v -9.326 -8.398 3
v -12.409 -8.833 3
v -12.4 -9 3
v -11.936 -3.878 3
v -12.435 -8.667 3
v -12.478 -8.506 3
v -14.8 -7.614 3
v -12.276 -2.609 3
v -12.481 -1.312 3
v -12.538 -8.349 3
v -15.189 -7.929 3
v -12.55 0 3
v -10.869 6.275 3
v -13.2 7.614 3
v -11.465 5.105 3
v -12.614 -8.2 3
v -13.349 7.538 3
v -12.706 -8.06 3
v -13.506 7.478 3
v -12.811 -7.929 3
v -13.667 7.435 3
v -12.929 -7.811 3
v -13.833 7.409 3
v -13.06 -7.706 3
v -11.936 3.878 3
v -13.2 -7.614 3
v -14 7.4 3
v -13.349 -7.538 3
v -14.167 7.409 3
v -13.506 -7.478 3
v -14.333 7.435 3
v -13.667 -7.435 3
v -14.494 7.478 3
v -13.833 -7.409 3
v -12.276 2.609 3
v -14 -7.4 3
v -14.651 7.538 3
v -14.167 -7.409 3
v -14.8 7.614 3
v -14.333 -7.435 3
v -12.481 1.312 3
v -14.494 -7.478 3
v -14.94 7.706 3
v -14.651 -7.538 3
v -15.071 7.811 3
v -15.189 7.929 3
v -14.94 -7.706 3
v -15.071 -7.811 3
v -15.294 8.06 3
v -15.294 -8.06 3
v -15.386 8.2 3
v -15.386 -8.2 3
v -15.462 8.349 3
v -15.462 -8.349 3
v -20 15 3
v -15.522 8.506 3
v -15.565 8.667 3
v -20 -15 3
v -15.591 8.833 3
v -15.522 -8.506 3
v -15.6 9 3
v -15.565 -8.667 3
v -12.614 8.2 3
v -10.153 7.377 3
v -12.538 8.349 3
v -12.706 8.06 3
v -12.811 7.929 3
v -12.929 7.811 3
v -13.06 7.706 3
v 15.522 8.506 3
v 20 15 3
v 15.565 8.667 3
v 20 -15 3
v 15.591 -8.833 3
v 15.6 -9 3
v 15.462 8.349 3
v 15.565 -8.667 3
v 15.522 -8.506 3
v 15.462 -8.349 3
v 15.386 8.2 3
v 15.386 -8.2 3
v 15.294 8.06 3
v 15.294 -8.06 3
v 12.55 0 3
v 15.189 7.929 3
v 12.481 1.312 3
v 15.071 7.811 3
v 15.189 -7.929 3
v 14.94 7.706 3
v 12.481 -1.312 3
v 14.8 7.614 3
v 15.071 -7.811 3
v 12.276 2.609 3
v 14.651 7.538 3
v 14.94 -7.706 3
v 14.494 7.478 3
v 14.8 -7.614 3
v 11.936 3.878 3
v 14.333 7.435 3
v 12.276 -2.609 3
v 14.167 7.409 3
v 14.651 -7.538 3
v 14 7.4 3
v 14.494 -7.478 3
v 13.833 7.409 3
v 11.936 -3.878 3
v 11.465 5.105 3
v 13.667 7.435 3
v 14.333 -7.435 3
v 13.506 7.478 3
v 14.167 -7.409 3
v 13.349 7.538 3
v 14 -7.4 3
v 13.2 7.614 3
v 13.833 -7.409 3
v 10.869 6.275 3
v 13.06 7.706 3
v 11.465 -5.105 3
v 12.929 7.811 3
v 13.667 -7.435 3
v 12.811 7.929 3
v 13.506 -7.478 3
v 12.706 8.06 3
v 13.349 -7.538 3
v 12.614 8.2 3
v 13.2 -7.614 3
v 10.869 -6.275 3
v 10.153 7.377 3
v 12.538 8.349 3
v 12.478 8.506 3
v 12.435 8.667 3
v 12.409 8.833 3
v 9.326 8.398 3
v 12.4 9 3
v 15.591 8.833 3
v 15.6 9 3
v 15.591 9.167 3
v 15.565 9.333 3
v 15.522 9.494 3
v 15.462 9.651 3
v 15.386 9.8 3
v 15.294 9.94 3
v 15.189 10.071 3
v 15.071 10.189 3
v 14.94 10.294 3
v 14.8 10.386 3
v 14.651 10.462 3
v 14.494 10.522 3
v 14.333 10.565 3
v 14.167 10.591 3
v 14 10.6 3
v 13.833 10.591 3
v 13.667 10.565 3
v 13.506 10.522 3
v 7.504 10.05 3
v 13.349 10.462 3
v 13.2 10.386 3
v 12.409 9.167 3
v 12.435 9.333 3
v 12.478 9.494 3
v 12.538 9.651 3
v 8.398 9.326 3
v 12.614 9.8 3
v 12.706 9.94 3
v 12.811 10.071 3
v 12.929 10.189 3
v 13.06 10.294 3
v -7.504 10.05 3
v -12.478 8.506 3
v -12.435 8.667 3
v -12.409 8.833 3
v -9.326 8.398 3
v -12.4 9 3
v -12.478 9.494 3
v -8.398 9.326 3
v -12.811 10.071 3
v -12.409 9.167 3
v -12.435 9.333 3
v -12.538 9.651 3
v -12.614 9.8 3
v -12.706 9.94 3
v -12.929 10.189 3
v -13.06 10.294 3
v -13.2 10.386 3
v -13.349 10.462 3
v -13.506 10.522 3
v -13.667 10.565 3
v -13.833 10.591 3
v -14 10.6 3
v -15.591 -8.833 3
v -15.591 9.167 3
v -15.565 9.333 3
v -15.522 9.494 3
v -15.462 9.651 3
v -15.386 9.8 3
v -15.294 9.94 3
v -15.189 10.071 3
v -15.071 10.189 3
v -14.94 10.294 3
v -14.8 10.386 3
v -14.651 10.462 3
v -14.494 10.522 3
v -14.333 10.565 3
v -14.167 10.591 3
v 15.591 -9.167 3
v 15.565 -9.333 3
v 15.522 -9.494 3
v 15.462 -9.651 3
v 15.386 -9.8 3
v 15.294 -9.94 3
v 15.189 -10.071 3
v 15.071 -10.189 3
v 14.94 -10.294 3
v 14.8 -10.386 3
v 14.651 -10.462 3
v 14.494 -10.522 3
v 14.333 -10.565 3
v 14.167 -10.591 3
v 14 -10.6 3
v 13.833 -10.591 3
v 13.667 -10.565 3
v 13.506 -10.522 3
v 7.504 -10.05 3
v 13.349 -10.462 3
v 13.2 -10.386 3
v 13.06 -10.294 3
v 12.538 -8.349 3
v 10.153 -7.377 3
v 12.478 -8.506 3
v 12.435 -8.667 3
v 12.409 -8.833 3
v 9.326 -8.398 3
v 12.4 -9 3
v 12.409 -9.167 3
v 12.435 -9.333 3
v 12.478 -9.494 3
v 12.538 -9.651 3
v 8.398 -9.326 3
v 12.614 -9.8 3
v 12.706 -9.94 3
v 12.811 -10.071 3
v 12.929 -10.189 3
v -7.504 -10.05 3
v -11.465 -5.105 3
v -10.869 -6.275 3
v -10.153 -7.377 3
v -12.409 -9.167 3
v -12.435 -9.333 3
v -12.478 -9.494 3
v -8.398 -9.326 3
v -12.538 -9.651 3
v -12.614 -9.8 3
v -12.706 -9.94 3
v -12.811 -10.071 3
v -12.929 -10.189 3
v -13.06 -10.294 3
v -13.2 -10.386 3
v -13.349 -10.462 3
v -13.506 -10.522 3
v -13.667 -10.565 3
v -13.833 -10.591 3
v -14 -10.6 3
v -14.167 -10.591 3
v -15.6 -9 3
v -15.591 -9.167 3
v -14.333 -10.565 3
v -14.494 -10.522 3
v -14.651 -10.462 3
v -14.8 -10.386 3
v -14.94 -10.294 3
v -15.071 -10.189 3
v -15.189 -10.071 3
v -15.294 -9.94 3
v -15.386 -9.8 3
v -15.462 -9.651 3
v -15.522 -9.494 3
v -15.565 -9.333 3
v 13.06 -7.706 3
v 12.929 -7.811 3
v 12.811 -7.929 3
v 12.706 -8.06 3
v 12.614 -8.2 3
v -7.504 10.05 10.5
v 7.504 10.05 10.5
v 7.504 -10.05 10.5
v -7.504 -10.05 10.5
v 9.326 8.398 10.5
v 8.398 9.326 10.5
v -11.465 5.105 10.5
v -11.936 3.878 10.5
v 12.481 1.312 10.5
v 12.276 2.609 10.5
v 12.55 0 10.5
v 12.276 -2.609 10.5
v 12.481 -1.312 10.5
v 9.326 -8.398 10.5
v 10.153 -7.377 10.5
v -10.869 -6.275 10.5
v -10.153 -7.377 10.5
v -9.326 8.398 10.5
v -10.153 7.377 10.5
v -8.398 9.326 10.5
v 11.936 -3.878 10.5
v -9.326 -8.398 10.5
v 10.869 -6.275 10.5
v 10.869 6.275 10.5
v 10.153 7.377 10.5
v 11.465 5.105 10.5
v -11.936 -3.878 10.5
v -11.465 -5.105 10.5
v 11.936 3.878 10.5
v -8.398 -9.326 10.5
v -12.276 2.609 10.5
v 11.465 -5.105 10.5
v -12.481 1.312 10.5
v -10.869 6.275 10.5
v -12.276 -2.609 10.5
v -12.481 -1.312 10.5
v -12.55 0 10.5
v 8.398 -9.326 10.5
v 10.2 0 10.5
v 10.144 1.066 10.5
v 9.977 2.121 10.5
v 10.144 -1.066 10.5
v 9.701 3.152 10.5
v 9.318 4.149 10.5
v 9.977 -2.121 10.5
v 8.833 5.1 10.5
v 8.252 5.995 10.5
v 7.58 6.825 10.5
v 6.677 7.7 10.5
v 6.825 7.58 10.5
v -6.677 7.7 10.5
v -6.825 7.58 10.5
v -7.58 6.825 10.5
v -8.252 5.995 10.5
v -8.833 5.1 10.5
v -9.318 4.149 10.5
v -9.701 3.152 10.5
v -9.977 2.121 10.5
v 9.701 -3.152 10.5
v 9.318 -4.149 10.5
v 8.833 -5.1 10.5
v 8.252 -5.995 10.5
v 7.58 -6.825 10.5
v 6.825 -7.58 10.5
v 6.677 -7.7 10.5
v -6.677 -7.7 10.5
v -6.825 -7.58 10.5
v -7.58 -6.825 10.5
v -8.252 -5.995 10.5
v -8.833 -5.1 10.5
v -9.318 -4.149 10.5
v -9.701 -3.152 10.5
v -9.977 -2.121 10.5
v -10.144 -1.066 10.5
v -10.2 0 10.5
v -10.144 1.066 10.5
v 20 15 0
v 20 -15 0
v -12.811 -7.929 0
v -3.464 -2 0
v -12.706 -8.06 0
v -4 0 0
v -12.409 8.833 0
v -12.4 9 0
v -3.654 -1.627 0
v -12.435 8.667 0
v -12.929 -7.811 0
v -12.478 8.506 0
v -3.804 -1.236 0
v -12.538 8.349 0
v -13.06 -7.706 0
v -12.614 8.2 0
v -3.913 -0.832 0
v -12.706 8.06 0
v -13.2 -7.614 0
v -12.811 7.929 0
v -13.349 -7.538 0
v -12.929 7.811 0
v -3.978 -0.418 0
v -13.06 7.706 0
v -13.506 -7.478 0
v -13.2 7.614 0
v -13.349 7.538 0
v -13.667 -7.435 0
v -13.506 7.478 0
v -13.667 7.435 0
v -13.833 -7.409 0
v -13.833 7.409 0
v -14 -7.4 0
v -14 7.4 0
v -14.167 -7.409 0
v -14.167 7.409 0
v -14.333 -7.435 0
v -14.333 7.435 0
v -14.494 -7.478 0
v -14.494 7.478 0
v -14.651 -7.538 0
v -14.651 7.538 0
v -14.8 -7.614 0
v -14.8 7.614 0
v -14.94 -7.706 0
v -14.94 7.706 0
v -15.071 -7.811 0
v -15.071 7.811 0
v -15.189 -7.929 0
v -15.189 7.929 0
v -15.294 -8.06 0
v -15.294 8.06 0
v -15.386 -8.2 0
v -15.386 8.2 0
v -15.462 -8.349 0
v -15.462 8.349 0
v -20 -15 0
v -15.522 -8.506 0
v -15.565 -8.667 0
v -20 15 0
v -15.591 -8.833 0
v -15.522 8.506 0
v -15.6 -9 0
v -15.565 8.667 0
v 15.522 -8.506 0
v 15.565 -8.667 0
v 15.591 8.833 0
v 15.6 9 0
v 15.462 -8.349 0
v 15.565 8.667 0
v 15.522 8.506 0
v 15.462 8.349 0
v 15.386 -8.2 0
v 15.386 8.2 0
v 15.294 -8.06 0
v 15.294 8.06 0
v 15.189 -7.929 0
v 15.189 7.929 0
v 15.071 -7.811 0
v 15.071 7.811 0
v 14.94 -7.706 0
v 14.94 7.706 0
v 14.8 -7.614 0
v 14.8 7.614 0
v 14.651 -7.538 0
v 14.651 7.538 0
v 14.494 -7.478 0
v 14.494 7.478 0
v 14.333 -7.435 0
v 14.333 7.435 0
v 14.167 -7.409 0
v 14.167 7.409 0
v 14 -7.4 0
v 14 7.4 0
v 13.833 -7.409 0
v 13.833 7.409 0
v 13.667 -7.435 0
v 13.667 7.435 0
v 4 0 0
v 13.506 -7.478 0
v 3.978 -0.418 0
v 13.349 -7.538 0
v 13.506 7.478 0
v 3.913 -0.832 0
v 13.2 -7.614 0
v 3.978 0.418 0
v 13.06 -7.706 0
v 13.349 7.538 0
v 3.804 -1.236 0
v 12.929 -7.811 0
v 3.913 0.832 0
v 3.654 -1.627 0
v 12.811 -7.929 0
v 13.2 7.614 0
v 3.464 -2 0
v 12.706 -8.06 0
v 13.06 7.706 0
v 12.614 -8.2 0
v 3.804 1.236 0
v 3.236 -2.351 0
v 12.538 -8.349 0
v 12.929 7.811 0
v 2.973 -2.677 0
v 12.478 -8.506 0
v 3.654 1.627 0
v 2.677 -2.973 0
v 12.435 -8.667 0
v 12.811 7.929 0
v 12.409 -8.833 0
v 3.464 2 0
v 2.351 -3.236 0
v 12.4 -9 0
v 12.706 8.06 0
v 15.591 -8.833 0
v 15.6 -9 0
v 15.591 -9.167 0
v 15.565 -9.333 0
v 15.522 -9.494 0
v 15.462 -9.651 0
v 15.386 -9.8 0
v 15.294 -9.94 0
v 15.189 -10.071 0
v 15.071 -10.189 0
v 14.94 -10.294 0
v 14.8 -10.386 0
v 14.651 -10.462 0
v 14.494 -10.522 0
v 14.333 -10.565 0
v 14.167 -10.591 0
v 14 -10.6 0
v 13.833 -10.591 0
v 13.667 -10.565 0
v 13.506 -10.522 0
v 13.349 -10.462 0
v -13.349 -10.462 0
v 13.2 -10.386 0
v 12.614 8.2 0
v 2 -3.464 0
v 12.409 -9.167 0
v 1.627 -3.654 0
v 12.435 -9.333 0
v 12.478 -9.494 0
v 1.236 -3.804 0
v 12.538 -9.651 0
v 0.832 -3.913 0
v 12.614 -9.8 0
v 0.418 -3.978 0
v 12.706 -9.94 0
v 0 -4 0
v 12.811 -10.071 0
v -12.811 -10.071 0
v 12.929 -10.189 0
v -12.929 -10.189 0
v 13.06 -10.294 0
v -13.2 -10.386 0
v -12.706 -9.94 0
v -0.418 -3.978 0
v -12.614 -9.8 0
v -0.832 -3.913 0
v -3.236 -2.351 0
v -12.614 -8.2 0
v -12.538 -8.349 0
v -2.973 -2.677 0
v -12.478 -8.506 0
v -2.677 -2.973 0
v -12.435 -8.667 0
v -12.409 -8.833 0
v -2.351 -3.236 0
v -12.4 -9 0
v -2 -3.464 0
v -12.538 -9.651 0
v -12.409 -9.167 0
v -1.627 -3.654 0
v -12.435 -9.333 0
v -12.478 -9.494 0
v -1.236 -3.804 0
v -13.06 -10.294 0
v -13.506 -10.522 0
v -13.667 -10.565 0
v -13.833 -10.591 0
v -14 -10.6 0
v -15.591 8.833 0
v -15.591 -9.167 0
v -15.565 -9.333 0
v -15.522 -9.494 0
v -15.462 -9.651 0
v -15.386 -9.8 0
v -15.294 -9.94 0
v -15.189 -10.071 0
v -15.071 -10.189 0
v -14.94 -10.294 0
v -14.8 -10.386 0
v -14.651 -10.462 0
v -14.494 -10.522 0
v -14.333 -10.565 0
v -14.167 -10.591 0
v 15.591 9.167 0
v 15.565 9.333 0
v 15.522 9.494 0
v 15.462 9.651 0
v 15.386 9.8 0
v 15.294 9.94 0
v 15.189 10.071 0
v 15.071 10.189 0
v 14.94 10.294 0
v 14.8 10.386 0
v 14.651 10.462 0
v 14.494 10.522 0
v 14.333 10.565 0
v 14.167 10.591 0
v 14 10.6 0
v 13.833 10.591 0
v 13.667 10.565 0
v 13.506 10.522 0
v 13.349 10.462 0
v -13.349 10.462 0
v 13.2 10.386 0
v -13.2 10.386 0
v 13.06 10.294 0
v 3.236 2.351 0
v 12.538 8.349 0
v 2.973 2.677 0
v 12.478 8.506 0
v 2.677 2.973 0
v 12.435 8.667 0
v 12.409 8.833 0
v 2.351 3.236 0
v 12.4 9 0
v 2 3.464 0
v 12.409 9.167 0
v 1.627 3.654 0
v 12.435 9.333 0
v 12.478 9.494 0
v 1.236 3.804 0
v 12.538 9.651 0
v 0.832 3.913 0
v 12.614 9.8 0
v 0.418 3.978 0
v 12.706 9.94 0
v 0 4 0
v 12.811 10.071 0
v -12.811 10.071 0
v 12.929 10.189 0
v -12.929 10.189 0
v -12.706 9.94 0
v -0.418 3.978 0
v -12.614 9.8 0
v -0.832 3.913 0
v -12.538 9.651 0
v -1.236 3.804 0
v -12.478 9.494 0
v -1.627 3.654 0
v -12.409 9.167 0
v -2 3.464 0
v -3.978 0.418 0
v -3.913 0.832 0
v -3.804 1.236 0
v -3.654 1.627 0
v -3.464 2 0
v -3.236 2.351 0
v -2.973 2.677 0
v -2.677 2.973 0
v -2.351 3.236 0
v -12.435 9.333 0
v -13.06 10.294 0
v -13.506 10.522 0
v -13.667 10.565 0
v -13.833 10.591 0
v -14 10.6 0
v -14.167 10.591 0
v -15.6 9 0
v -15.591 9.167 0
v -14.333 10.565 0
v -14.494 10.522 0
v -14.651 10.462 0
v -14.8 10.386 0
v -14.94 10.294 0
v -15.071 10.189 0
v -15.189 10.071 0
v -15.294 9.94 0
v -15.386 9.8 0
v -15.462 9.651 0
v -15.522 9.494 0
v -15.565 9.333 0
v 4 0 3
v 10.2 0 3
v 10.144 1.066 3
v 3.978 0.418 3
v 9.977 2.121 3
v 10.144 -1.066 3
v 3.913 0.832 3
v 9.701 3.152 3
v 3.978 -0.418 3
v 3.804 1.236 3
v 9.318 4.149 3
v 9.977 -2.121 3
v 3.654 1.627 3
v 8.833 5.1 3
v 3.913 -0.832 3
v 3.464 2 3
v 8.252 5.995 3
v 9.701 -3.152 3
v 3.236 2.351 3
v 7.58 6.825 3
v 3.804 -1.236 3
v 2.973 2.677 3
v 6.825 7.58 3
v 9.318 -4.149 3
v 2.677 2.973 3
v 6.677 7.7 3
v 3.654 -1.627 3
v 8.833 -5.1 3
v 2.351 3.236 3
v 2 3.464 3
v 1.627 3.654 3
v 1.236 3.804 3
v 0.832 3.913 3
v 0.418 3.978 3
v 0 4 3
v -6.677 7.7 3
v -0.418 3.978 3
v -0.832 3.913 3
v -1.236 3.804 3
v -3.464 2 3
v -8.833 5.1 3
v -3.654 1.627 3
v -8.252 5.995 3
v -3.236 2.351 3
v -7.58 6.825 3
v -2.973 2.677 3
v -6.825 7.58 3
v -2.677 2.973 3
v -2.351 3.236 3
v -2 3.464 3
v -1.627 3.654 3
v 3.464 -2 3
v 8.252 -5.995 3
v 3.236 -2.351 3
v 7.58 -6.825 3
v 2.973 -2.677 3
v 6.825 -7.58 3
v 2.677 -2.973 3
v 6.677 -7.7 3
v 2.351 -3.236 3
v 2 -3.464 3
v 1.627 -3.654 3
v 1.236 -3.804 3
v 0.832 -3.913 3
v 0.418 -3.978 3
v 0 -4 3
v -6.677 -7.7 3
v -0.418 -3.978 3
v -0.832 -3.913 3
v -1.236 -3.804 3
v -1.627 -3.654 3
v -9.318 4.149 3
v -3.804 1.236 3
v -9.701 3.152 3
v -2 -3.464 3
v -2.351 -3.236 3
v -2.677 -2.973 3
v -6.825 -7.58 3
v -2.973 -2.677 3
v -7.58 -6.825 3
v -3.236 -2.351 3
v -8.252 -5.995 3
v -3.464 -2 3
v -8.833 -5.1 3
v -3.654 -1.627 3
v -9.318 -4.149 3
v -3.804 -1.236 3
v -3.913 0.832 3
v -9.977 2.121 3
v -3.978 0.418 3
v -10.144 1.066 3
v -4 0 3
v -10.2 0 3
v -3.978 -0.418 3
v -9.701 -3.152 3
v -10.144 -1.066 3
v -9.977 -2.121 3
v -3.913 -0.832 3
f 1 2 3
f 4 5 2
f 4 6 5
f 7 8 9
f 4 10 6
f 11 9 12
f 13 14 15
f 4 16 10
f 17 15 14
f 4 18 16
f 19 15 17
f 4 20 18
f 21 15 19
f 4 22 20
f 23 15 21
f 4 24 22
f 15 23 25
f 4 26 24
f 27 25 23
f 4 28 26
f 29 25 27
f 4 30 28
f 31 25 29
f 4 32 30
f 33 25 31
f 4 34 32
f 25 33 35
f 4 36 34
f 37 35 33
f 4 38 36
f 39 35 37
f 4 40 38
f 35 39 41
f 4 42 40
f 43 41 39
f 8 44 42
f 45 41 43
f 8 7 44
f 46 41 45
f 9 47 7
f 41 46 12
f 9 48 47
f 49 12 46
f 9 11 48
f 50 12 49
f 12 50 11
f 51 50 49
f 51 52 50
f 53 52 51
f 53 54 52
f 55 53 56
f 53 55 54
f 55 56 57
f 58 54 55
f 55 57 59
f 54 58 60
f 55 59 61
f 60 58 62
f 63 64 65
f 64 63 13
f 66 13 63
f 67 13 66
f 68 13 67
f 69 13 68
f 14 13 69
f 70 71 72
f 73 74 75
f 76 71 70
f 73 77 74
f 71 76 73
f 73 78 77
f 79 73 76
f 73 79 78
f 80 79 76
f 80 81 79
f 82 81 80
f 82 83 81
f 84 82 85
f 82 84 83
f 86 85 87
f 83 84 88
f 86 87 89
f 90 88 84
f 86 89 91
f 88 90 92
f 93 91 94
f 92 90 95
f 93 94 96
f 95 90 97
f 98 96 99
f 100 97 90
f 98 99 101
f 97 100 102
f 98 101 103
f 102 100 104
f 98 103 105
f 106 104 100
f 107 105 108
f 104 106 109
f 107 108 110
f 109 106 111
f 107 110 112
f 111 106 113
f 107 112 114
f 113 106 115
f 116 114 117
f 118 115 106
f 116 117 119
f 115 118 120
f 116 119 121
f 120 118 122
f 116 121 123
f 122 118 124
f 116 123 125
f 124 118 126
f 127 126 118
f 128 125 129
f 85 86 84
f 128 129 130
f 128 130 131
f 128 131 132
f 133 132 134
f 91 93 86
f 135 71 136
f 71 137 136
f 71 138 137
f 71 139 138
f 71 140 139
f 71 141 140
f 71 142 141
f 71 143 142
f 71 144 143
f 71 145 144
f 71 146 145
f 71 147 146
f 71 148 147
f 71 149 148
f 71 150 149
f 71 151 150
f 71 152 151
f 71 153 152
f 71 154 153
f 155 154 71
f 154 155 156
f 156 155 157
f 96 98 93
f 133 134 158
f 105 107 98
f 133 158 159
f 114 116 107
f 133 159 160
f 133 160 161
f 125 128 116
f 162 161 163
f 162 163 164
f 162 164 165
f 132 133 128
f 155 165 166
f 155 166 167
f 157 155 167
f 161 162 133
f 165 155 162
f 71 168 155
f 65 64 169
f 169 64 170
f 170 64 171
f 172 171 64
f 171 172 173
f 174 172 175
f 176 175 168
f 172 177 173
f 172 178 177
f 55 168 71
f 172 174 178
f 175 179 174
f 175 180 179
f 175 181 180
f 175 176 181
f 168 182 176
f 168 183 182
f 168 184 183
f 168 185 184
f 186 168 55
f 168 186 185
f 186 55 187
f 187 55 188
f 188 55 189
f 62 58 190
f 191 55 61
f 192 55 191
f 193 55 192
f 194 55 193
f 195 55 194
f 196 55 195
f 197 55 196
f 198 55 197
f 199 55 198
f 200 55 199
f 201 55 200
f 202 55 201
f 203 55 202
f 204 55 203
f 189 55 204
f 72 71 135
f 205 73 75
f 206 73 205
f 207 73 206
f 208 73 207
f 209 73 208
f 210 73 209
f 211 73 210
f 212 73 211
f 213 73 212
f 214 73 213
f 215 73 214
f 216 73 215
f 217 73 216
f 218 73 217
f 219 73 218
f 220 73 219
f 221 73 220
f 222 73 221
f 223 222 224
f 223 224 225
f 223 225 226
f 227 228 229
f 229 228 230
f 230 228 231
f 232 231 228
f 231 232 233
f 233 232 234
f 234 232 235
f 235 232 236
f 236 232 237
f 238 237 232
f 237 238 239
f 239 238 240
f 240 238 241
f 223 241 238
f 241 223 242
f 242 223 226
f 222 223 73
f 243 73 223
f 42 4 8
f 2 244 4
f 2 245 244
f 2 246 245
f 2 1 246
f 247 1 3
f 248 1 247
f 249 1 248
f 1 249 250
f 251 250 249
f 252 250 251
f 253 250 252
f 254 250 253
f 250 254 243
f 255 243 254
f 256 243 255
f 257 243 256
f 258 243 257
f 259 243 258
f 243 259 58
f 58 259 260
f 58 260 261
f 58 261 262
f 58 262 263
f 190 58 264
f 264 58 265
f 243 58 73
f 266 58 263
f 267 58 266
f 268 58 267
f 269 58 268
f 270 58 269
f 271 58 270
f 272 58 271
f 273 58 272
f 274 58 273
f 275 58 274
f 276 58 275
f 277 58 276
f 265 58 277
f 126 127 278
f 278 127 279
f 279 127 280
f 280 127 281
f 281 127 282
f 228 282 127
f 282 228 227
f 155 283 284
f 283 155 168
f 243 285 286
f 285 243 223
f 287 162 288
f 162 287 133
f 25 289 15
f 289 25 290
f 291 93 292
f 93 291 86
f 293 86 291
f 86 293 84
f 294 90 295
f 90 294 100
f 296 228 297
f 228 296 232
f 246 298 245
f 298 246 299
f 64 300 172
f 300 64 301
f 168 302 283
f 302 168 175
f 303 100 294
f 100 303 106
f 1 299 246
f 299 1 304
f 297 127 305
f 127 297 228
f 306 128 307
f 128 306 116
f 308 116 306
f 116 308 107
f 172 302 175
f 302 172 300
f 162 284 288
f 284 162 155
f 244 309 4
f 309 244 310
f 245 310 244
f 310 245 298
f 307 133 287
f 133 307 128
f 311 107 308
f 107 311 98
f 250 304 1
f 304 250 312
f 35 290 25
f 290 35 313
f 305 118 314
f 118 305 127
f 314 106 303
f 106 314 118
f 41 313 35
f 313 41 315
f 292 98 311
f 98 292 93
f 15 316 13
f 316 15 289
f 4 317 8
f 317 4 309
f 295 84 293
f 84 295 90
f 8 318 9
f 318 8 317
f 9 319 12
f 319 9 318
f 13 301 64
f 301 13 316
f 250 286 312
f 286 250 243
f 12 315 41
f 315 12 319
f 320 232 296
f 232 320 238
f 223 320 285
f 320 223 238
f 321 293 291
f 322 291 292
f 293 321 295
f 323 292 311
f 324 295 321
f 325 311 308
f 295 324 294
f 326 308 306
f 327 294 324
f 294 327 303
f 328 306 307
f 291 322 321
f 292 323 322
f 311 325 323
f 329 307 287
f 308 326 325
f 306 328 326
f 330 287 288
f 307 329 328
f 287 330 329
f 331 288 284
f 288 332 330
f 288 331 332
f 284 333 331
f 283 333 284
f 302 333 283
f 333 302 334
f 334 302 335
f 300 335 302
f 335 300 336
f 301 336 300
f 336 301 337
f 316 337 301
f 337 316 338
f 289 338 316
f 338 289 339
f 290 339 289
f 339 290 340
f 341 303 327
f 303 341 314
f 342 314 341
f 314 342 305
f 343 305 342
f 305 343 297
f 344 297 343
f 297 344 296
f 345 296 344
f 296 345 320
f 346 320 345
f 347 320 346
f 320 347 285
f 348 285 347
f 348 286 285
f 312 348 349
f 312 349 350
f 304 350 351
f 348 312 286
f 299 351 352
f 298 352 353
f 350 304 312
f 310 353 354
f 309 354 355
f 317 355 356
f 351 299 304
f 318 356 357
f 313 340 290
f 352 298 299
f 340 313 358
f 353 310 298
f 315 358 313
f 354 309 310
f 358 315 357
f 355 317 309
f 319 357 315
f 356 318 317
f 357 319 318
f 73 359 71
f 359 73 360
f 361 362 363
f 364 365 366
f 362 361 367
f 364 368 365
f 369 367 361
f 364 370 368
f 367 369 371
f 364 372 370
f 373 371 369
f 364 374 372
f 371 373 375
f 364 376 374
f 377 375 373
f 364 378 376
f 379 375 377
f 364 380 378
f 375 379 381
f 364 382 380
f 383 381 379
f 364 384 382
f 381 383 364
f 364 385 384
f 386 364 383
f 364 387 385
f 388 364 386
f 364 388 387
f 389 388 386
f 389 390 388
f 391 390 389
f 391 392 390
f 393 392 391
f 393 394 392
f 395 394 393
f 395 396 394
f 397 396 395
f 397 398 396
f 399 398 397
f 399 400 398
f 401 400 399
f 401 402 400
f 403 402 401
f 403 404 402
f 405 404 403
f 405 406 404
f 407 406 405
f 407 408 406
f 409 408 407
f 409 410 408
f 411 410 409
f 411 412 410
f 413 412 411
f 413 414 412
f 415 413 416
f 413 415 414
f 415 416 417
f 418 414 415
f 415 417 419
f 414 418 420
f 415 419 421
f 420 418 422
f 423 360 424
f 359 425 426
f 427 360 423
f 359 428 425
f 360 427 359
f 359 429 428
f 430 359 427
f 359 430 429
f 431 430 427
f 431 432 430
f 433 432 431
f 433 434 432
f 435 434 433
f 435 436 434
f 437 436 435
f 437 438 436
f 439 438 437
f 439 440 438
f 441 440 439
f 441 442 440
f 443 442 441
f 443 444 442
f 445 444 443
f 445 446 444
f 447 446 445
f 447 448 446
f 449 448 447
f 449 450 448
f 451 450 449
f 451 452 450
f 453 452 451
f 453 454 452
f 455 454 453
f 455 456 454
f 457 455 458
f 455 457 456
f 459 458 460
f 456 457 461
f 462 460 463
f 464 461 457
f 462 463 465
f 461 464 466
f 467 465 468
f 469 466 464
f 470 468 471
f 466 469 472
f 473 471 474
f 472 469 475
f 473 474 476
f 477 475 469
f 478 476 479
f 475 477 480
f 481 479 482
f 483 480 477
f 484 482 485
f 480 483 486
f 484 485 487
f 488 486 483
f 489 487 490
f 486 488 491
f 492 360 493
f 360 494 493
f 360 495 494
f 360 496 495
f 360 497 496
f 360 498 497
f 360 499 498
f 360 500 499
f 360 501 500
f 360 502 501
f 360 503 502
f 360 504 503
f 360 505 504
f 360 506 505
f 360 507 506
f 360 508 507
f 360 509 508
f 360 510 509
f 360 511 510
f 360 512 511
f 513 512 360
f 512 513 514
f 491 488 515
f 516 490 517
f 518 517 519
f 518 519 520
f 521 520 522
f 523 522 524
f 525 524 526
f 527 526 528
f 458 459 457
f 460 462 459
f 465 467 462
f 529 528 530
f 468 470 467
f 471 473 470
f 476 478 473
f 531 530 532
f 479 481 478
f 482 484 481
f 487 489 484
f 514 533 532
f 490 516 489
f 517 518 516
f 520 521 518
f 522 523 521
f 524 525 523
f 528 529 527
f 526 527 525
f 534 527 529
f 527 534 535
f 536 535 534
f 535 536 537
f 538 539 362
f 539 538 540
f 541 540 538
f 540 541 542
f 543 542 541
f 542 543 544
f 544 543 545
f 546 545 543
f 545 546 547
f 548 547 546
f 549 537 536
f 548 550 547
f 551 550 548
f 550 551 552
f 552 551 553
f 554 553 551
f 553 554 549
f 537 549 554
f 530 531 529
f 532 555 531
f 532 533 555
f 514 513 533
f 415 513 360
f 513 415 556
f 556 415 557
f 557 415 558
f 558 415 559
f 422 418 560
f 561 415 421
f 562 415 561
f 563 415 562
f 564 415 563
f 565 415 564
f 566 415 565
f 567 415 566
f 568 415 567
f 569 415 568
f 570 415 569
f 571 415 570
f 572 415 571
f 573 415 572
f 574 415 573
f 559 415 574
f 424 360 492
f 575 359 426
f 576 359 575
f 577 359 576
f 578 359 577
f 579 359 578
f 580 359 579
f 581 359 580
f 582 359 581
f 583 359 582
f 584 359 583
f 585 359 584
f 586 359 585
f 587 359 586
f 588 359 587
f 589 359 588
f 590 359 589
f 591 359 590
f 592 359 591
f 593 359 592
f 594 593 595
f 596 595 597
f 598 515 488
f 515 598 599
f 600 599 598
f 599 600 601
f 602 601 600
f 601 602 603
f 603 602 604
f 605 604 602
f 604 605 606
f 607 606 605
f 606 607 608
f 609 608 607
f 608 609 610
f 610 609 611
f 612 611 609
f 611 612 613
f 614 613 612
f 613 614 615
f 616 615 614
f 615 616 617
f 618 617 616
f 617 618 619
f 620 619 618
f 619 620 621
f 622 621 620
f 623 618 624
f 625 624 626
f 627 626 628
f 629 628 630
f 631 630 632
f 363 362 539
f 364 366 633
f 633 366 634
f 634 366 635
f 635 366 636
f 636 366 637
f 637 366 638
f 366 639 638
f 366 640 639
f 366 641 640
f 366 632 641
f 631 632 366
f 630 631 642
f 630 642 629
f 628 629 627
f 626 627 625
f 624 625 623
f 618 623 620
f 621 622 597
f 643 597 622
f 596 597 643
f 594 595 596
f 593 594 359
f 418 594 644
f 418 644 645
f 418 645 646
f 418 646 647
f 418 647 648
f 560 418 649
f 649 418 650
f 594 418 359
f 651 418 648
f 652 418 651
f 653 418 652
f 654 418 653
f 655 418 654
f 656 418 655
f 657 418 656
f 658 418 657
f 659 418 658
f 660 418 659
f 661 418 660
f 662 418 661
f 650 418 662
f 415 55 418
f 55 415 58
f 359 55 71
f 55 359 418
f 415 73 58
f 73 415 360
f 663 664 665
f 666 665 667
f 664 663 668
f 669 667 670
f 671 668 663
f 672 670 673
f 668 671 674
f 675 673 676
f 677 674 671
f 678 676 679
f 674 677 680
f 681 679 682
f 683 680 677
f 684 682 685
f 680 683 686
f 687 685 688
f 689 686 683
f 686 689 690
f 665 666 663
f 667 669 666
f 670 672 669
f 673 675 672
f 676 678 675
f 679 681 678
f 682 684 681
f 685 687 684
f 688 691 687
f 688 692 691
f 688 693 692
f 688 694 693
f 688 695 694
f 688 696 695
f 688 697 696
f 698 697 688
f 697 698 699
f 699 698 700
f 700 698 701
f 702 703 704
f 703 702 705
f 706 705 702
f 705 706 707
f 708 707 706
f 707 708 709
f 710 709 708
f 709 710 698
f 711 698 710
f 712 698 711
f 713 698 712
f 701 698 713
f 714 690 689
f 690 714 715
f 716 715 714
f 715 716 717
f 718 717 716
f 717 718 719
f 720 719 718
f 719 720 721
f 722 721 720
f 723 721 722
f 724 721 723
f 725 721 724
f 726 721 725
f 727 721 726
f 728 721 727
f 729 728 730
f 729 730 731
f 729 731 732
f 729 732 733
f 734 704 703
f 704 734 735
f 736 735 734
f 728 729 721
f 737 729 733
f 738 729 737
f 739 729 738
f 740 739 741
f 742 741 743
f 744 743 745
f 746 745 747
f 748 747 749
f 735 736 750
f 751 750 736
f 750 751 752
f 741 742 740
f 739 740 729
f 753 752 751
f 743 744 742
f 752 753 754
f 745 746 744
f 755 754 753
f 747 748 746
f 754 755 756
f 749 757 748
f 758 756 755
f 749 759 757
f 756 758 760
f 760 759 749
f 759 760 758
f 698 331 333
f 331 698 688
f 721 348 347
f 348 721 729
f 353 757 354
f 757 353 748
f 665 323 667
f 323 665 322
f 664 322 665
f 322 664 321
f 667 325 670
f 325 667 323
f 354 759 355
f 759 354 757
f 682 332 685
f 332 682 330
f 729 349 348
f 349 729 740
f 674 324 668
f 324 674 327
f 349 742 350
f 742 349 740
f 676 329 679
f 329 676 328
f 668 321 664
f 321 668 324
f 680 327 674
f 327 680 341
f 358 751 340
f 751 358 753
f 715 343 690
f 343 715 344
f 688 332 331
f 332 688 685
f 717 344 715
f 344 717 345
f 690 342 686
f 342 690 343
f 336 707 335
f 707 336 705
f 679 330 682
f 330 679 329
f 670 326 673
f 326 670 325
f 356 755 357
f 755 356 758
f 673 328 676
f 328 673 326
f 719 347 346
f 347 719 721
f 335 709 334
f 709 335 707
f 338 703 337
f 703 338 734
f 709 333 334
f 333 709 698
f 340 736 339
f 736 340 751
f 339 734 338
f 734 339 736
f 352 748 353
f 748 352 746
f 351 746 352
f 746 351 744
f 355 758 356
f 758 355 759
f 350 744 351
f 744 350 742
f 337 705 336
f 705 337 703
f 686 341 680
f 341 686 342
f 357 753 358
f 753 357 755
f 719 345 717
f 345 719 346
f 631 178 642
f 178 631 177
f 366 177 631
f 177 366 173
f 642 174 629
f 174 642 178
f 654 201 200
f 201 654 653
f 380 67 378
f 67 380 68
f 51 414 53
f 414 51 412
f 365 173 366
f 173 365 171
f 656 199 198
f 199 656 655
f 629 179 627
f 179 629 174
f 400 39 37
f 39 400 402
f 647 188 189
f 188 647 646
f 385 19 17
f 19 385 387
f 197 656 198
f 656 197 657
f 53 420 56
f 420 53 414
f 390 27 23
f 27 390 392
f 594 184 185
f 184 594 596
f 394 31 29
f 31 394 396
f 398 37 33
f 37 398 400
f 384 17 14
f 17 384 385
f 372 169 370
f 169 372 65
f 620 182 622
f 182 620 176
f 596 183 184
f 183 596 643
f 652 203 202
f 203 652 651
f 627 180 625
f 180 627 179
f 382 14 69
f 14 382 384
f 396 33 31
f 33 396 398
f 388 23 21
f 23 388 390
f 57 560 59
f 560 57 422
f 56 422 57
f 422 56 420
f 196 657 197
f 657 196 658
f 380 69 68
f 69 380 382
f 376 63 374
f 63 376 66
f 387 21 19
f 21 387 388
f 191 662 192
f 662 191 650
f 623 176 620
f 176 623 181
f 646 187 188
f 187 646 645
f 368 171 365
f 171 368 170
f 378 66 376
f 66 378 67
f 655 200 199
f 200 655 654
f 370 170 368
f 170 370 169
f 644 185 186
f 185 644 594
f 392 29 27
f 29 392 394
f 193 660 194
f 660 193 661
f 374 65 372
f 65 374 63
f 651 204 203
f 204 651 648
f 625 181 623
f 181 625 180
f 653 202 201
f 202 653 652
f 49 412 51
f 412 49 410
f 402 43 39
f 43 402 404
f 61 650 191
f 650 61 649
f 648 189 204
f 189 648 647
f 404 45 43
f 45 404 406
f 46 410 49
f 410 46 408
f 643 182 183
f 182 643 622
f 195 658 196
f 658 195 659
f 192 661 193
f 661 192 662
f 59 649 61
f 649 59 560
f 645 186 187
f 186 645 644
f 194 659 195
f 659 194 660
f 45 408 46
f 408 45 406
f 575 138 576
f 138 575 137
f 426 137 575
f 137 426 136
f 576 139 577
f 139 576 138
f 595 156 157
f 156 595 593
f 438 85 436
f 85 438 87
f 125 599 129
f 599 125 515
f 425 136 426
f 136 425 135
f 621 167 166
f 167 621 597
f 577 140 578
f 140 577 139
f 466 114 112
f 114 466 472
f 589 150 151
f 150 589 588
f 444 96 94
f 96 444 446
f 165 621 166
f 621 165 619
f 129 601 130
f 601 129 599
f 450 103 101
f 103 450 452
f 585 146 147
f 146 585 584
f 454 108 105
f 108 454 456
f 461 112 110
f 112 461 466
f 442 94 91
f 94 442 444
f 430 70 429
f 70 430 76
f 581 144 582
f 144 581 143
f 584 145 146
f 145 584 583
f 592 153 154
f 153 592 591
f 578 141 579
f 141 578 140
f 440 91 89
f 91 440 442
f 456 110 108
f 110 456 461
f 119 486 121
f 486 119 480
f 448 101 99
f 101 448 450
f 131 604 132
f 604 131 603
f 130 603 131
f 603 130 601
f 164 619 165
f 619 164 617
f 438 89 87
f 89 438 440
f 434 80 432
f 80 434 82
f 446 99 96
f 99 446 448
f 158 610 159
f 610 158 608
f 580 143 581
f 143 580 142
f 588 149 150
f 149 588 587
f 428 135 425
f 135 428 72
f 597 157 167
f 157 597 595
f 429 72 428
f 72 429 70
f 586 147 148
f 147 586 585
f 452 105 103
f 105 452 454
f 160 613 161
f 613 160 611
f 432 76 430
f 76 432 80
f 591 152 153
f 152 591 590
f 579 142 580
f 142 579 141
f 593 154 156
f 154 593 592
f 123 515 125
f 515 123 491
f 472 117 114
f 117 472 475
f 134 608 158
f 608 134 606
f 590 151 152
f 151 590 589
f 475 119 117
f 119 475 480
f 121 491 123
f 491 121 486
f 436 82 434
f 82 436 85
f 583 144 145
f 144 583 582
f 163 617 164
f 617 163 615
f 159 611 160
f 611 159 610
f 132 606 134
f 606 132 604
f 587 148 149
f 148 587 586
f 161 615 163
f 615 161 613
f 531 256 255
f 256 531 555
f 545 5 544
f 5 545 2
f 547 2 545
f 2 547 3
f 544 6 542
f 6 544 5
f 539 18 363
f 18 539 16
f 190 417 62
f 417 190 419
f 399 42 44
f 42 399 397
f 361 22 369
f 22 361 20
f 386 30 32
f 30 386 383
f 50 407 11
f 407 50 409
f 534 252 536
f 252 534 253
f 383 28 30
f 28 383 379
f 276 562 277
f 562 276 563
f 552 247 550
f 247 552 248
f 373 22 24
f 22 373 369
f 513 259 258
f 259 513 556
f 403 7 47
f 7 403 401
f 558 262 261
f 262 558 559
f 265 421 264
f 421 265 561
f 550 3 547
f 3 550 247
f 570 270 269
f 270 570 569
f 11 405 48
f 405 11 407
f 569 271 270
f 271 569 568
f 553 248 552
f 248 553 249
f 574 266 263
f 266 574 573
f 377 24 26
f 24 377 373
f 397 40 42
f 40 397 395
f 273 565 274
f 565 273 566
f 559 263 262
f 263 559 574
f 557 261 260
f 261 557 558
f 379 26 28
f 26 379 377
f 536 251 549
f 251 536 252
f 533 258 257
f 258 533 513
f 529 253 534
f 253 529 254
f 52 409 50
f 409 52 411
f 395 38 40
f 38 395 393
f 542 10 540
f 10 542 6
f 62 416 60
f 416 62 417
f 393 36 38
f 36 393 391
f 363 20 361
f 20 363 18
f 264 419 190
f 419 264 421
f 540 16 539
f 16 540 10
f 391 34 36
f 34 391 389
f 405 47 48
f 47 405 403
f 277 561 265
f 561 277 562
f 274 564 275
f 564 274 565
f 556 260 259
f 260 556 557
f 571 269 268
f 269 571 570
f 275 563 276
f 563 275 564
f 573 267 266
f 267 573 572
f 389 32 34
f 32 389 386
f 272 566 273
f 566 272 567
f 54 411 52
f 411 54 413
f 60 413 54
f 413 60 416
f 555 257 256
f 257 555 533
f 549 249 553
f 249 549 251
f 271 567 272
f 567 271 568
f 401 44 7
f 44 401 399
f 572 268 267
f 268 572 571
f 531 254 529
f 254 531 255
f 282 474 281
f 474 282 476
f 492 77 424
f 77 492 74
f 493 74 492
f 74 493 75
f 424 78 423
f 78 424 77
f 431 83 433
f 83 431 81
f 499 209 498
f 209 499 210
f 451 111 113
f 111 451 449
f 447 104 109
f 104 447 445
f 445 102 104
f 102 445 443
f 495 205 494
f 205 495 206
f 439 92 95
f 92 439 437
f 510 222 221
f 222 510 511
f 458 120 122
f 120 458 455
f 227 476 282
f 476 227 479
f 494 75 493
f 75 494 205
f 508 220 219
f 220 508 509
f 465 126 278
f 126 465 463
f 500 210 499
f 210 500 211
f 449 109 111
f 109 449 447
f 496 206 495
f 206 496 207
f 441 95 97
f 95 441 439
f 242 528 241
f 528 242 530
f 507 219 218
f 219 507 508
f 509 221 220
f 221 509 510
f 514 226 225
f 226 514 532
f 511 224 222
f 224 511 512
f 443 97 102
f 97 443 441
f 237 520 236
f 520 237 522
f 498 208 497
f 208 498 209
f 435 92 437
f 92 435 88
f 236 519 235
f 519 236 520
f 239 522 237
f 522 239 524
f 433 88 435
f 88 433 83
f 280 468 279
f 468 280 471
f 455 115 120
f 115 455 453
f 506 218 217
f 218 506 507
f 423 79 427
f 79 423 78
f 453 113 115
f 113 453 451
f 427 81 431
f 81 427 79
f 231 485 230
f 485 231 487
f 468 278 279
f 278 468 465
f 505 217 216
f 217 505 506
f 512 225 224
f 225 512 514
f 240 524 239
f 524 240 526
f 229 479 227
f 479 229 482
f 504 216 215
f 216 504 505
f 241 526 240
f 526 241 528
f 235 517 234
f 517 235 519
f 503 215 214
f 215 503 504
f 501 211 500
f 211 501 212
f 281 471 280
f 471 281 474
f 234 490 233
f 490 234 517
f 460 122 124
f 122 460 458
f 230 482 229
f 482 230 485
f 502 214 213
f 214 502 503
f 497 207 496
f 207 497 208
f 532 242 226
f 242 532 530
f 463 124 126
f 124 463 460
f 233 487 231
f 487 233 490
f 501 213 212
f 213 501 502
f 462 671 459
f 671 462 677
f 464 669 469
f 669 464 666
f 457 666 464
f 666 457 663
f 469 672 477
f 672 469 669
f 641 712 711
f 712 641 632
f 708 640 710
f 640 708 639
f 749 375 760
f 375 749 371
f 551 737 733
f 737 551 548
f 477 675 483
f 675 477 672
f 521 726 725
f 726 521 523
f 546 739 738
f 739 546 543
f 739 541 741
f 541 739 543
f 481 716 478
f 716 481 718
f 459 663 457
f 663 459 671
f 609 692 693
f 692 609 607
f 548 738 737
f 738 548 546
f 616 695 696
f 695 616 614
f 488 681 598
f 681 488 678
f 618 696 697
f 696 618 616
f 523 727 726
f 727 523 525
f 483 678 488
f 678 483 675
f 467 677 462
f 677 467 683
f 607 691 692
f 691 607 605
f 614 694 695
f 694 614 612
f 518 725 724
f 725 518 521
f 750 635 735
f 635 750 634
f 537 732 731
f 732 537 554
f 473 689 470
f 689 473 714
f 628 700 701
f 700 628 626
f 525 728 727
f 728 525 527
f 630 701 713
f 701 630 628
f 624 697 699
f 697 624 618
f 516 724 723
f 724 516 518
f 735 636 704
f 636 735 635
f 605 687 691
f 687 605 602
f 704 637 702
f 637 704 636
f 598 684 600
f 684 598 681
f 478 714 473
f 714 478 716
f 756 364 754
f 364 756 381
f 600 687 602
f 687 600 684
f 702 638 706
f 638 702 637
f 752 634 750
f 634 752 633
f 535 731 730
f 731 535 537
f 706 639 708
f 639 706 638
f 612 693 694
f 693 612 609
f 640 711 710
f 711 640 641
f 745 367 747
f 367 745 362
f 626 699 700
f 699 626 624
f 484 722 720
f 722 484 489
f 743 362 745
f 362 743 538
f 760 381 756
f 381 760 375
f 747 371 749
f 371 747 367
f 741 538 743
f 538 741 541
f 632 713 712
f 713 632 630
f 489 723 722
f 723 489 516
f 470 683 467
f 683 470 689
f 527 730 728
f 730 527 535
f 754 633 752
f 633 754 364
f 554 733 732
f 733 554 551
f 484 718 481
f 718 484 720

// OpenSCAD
// ===== MOTOR PARAMETERS (from your model) =====
motor_outer_dia = 20.10;
motor_length = 25;
motor_flat_width = 15.10;
shaft_extension_dia = 2;
tab_width = 8.5;
tab_thickness = 1.5;
tab_height = 4;

// ===== MOUNT PARAMETERS =====
// Base plate
base_length = 40;
base_width = 30;
base_thickness = 3;

// Motor cradle
cradle_wall_thickness = 2.5;
cradle_height = 15; // Height of cradle walls
motor_clearance = 0.3; // Clearance around motor

// Shaft clearance hole
shaft_hole_dia = 8; // Larger hole for shaft clearance

// Mounting holes
mount_hole_dia = 3.2; // M3 screw holes
mount_hole_positions = [
    [-base_length/2 + 6, base_width/2 - 6],
    [base_length/2 - 6, base_width/2 - 6],
    [-base_length/2 + 6, -base_width/2 + 6],
    [base_length/2 - 6, -base_width/2 + 6]
];

// Tab slot
tab_slot_width = tab_width + 0.4;
tab_slot_depth = tab_thickness + 0.3;
tab_slot_height = tab_height + 0.5;

$fn = 60;

// ===== MAIN ASSEMBLY =====
motor_mount();

// ===== MODULES =====
module motor_mount() {
    difference() {
        union() {
            // Base plate
            translate([-base_length/2, -base_width/2, 0]) {
                cube([base_length, base_width, base_thickness]);
            }
            
            // Motor cradle
            motor_cradle();
        }
        
        // Motor cavity (with flat side)
        translate([0, 0, base_thickness]) {
            motor_cavity();
        }
        
        // Tab slot
        translate([0, 0, base_thickness + cradle_height - tab_slot_height]) {
            tab_slot();
        }
        
        // Shaft clearance hole
        translate([0, 0, -0.1]) {
            cylinder(h = base_thickness + 0.2, d = shaft_hole_dia);
        }
        
        // Mounting holes
        for (pos = mount_hole_positions) {
            translate([pos[0], pos[1], -0.1]) {
                cylinder(h = base_thickness + 0.2, d = mount_hole_dia);
            }
        }
    }
}

module motor_cradle() {
    difference() {
        // Outer cylinder
        translate([0, 0, base_thickness]) {
            intersection() {
                centered_cube(100, motor_flat_width + 2*cradle_wall_thickness, 100);
                cylinder(h = cradle_height, d = motor_outer_dia + 2*cradle_wall_thickness);
            }
        }
        
        // Remove top to create open cradle
        translate([0, 0, base_thickness + cradle_height/2]) {
            centered_cube(motor_outer_dia + 2*cradle_wall_thickness + 1, 100, cradle_height + 1);
        }
    }
}

module motor_cavity() {
    intersection() {
        centered_cube(100, motor_flat_width + motor_clearance, 100);
        cylinder(h = cradle_height + 1, d = motor_outer_dia + motor_clearance);
    }
}

module tab_slot() {
    translate([-tab_slot_width/2, motor_flat_width/2 + motor_clearance/2, 0]) {
        cube([tab_slot_width, tab_slot_depth + 1, tab_slot_height + 1]);
    }
}

// Utility: Centered cube
module centered_cube(x, y, z) {
    translate([-x/2, -y/2, 0]) {
        cube([x, y, z]);
    }
}
